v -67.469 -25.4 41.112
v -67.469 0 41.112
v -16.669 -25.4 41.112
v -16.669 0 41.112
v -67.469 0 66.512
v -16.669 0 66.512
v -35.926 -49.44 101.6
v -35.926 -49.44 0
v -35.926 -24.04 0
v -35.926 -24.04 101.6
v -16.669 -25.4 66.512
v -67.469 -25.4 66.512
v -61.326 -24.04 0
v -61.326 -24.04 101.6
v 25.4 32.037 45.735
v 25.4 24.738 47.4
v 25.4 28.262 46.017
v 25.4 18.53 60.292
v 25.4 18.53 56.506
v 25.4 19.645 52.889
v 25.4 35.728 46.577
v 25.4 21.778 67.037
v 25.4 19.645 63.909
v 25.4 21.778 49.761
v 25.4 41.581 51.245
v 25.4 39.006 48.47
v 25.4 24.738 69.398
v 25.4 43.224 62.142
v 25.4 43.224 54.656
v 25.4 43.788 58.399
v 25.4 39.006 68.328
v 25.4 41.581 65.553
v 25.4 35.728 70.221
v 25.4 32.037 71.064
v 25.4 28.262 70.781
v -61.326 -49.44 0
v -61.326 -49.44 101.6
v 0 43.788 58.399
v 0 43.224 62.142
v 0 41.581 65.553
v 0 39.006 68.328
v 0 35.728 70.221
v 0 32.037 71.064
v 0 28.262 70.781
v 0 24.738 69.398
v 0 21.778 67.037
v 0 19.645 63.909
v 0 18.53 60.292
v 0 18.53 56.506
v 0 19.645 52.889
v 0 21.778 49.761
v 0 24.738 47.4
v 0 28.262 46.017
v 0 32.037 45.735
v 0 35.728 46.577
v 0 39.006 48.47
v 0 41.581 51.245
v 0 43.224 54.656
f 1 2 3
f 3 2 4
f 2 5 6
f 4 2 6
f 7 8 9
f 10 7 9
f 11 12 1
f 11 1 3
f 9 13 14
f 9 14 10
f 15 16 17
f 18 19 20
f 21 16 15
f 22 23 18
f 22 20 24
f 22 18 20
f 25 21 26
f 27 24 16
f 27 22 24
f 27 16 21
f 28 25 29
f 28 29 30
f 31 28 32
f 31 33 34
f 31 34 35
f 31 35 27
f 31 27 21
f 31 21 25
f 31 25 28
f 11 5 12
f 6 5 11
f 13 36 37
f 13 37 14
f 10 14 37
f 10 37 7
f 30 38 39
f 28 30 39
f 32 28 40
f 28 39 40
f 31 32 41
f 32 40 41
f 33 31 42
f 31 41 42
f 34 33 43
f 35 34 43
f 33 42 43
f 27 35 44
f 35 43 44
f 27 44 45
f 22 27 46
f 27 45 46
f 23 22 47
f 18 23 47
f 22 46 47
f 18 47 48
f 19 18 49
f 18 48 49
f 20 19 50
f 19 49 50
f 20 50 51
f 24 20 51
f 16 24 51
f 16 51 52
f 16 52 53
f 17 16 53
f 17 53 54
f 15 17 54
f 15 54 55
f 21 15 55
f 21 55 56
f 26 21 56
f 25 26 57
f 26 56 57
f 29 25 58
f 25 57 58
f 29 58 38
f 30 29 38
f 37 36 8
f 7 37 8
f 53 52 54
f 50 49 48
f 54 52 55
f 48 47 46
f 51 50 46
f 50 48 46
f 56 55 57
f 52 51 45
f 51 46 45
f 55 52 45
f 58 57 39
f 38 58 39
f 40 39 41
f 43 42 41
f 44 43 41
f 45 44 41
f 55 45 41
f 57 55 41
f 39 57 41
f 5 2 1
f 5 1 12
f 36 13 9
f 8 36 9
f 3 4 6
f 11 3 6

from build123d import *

# Parameters (mm, degrees)
F0_W     = 50.8
F0_H     = 25.4
F1_DEPTH = 25.4
F2_W     = 25.4
F2_H     = 25.4
F3_DEPTH = 101.6
F4_R     = 12.7
F5_DEPTH = 25.4


with BuildPart() as f1:
    # F0 (on Front) → F1 (new body)
    with BuildSketch(Plane.XZ):
        with Locations((-42.06913, 53.811623)):
            Rectangle(F0_W, F0_H)
    extrude(amount=F1_DEPTH)


with BuildPart() as f3:
    # F2 (on Top) → F3 (new body)
    with BuildSketch(Plane.XY):
        with Locations((-48.625704, -36.74018)):
            Rectangle(F2_W, F2_H)
    extrude(amount=F3_DEPTH)


with BuildPart() as f5:
    # F4 (on Right) → F5 (new body)
    with BuildSketch(Plane.YZ):
        with Locations((31.087756, 58.399018)):
            Circle(F4_R)
    extrude(amount=F5_DEPTH)


solid = Compound([f1.part, f3.part, f5.part])
